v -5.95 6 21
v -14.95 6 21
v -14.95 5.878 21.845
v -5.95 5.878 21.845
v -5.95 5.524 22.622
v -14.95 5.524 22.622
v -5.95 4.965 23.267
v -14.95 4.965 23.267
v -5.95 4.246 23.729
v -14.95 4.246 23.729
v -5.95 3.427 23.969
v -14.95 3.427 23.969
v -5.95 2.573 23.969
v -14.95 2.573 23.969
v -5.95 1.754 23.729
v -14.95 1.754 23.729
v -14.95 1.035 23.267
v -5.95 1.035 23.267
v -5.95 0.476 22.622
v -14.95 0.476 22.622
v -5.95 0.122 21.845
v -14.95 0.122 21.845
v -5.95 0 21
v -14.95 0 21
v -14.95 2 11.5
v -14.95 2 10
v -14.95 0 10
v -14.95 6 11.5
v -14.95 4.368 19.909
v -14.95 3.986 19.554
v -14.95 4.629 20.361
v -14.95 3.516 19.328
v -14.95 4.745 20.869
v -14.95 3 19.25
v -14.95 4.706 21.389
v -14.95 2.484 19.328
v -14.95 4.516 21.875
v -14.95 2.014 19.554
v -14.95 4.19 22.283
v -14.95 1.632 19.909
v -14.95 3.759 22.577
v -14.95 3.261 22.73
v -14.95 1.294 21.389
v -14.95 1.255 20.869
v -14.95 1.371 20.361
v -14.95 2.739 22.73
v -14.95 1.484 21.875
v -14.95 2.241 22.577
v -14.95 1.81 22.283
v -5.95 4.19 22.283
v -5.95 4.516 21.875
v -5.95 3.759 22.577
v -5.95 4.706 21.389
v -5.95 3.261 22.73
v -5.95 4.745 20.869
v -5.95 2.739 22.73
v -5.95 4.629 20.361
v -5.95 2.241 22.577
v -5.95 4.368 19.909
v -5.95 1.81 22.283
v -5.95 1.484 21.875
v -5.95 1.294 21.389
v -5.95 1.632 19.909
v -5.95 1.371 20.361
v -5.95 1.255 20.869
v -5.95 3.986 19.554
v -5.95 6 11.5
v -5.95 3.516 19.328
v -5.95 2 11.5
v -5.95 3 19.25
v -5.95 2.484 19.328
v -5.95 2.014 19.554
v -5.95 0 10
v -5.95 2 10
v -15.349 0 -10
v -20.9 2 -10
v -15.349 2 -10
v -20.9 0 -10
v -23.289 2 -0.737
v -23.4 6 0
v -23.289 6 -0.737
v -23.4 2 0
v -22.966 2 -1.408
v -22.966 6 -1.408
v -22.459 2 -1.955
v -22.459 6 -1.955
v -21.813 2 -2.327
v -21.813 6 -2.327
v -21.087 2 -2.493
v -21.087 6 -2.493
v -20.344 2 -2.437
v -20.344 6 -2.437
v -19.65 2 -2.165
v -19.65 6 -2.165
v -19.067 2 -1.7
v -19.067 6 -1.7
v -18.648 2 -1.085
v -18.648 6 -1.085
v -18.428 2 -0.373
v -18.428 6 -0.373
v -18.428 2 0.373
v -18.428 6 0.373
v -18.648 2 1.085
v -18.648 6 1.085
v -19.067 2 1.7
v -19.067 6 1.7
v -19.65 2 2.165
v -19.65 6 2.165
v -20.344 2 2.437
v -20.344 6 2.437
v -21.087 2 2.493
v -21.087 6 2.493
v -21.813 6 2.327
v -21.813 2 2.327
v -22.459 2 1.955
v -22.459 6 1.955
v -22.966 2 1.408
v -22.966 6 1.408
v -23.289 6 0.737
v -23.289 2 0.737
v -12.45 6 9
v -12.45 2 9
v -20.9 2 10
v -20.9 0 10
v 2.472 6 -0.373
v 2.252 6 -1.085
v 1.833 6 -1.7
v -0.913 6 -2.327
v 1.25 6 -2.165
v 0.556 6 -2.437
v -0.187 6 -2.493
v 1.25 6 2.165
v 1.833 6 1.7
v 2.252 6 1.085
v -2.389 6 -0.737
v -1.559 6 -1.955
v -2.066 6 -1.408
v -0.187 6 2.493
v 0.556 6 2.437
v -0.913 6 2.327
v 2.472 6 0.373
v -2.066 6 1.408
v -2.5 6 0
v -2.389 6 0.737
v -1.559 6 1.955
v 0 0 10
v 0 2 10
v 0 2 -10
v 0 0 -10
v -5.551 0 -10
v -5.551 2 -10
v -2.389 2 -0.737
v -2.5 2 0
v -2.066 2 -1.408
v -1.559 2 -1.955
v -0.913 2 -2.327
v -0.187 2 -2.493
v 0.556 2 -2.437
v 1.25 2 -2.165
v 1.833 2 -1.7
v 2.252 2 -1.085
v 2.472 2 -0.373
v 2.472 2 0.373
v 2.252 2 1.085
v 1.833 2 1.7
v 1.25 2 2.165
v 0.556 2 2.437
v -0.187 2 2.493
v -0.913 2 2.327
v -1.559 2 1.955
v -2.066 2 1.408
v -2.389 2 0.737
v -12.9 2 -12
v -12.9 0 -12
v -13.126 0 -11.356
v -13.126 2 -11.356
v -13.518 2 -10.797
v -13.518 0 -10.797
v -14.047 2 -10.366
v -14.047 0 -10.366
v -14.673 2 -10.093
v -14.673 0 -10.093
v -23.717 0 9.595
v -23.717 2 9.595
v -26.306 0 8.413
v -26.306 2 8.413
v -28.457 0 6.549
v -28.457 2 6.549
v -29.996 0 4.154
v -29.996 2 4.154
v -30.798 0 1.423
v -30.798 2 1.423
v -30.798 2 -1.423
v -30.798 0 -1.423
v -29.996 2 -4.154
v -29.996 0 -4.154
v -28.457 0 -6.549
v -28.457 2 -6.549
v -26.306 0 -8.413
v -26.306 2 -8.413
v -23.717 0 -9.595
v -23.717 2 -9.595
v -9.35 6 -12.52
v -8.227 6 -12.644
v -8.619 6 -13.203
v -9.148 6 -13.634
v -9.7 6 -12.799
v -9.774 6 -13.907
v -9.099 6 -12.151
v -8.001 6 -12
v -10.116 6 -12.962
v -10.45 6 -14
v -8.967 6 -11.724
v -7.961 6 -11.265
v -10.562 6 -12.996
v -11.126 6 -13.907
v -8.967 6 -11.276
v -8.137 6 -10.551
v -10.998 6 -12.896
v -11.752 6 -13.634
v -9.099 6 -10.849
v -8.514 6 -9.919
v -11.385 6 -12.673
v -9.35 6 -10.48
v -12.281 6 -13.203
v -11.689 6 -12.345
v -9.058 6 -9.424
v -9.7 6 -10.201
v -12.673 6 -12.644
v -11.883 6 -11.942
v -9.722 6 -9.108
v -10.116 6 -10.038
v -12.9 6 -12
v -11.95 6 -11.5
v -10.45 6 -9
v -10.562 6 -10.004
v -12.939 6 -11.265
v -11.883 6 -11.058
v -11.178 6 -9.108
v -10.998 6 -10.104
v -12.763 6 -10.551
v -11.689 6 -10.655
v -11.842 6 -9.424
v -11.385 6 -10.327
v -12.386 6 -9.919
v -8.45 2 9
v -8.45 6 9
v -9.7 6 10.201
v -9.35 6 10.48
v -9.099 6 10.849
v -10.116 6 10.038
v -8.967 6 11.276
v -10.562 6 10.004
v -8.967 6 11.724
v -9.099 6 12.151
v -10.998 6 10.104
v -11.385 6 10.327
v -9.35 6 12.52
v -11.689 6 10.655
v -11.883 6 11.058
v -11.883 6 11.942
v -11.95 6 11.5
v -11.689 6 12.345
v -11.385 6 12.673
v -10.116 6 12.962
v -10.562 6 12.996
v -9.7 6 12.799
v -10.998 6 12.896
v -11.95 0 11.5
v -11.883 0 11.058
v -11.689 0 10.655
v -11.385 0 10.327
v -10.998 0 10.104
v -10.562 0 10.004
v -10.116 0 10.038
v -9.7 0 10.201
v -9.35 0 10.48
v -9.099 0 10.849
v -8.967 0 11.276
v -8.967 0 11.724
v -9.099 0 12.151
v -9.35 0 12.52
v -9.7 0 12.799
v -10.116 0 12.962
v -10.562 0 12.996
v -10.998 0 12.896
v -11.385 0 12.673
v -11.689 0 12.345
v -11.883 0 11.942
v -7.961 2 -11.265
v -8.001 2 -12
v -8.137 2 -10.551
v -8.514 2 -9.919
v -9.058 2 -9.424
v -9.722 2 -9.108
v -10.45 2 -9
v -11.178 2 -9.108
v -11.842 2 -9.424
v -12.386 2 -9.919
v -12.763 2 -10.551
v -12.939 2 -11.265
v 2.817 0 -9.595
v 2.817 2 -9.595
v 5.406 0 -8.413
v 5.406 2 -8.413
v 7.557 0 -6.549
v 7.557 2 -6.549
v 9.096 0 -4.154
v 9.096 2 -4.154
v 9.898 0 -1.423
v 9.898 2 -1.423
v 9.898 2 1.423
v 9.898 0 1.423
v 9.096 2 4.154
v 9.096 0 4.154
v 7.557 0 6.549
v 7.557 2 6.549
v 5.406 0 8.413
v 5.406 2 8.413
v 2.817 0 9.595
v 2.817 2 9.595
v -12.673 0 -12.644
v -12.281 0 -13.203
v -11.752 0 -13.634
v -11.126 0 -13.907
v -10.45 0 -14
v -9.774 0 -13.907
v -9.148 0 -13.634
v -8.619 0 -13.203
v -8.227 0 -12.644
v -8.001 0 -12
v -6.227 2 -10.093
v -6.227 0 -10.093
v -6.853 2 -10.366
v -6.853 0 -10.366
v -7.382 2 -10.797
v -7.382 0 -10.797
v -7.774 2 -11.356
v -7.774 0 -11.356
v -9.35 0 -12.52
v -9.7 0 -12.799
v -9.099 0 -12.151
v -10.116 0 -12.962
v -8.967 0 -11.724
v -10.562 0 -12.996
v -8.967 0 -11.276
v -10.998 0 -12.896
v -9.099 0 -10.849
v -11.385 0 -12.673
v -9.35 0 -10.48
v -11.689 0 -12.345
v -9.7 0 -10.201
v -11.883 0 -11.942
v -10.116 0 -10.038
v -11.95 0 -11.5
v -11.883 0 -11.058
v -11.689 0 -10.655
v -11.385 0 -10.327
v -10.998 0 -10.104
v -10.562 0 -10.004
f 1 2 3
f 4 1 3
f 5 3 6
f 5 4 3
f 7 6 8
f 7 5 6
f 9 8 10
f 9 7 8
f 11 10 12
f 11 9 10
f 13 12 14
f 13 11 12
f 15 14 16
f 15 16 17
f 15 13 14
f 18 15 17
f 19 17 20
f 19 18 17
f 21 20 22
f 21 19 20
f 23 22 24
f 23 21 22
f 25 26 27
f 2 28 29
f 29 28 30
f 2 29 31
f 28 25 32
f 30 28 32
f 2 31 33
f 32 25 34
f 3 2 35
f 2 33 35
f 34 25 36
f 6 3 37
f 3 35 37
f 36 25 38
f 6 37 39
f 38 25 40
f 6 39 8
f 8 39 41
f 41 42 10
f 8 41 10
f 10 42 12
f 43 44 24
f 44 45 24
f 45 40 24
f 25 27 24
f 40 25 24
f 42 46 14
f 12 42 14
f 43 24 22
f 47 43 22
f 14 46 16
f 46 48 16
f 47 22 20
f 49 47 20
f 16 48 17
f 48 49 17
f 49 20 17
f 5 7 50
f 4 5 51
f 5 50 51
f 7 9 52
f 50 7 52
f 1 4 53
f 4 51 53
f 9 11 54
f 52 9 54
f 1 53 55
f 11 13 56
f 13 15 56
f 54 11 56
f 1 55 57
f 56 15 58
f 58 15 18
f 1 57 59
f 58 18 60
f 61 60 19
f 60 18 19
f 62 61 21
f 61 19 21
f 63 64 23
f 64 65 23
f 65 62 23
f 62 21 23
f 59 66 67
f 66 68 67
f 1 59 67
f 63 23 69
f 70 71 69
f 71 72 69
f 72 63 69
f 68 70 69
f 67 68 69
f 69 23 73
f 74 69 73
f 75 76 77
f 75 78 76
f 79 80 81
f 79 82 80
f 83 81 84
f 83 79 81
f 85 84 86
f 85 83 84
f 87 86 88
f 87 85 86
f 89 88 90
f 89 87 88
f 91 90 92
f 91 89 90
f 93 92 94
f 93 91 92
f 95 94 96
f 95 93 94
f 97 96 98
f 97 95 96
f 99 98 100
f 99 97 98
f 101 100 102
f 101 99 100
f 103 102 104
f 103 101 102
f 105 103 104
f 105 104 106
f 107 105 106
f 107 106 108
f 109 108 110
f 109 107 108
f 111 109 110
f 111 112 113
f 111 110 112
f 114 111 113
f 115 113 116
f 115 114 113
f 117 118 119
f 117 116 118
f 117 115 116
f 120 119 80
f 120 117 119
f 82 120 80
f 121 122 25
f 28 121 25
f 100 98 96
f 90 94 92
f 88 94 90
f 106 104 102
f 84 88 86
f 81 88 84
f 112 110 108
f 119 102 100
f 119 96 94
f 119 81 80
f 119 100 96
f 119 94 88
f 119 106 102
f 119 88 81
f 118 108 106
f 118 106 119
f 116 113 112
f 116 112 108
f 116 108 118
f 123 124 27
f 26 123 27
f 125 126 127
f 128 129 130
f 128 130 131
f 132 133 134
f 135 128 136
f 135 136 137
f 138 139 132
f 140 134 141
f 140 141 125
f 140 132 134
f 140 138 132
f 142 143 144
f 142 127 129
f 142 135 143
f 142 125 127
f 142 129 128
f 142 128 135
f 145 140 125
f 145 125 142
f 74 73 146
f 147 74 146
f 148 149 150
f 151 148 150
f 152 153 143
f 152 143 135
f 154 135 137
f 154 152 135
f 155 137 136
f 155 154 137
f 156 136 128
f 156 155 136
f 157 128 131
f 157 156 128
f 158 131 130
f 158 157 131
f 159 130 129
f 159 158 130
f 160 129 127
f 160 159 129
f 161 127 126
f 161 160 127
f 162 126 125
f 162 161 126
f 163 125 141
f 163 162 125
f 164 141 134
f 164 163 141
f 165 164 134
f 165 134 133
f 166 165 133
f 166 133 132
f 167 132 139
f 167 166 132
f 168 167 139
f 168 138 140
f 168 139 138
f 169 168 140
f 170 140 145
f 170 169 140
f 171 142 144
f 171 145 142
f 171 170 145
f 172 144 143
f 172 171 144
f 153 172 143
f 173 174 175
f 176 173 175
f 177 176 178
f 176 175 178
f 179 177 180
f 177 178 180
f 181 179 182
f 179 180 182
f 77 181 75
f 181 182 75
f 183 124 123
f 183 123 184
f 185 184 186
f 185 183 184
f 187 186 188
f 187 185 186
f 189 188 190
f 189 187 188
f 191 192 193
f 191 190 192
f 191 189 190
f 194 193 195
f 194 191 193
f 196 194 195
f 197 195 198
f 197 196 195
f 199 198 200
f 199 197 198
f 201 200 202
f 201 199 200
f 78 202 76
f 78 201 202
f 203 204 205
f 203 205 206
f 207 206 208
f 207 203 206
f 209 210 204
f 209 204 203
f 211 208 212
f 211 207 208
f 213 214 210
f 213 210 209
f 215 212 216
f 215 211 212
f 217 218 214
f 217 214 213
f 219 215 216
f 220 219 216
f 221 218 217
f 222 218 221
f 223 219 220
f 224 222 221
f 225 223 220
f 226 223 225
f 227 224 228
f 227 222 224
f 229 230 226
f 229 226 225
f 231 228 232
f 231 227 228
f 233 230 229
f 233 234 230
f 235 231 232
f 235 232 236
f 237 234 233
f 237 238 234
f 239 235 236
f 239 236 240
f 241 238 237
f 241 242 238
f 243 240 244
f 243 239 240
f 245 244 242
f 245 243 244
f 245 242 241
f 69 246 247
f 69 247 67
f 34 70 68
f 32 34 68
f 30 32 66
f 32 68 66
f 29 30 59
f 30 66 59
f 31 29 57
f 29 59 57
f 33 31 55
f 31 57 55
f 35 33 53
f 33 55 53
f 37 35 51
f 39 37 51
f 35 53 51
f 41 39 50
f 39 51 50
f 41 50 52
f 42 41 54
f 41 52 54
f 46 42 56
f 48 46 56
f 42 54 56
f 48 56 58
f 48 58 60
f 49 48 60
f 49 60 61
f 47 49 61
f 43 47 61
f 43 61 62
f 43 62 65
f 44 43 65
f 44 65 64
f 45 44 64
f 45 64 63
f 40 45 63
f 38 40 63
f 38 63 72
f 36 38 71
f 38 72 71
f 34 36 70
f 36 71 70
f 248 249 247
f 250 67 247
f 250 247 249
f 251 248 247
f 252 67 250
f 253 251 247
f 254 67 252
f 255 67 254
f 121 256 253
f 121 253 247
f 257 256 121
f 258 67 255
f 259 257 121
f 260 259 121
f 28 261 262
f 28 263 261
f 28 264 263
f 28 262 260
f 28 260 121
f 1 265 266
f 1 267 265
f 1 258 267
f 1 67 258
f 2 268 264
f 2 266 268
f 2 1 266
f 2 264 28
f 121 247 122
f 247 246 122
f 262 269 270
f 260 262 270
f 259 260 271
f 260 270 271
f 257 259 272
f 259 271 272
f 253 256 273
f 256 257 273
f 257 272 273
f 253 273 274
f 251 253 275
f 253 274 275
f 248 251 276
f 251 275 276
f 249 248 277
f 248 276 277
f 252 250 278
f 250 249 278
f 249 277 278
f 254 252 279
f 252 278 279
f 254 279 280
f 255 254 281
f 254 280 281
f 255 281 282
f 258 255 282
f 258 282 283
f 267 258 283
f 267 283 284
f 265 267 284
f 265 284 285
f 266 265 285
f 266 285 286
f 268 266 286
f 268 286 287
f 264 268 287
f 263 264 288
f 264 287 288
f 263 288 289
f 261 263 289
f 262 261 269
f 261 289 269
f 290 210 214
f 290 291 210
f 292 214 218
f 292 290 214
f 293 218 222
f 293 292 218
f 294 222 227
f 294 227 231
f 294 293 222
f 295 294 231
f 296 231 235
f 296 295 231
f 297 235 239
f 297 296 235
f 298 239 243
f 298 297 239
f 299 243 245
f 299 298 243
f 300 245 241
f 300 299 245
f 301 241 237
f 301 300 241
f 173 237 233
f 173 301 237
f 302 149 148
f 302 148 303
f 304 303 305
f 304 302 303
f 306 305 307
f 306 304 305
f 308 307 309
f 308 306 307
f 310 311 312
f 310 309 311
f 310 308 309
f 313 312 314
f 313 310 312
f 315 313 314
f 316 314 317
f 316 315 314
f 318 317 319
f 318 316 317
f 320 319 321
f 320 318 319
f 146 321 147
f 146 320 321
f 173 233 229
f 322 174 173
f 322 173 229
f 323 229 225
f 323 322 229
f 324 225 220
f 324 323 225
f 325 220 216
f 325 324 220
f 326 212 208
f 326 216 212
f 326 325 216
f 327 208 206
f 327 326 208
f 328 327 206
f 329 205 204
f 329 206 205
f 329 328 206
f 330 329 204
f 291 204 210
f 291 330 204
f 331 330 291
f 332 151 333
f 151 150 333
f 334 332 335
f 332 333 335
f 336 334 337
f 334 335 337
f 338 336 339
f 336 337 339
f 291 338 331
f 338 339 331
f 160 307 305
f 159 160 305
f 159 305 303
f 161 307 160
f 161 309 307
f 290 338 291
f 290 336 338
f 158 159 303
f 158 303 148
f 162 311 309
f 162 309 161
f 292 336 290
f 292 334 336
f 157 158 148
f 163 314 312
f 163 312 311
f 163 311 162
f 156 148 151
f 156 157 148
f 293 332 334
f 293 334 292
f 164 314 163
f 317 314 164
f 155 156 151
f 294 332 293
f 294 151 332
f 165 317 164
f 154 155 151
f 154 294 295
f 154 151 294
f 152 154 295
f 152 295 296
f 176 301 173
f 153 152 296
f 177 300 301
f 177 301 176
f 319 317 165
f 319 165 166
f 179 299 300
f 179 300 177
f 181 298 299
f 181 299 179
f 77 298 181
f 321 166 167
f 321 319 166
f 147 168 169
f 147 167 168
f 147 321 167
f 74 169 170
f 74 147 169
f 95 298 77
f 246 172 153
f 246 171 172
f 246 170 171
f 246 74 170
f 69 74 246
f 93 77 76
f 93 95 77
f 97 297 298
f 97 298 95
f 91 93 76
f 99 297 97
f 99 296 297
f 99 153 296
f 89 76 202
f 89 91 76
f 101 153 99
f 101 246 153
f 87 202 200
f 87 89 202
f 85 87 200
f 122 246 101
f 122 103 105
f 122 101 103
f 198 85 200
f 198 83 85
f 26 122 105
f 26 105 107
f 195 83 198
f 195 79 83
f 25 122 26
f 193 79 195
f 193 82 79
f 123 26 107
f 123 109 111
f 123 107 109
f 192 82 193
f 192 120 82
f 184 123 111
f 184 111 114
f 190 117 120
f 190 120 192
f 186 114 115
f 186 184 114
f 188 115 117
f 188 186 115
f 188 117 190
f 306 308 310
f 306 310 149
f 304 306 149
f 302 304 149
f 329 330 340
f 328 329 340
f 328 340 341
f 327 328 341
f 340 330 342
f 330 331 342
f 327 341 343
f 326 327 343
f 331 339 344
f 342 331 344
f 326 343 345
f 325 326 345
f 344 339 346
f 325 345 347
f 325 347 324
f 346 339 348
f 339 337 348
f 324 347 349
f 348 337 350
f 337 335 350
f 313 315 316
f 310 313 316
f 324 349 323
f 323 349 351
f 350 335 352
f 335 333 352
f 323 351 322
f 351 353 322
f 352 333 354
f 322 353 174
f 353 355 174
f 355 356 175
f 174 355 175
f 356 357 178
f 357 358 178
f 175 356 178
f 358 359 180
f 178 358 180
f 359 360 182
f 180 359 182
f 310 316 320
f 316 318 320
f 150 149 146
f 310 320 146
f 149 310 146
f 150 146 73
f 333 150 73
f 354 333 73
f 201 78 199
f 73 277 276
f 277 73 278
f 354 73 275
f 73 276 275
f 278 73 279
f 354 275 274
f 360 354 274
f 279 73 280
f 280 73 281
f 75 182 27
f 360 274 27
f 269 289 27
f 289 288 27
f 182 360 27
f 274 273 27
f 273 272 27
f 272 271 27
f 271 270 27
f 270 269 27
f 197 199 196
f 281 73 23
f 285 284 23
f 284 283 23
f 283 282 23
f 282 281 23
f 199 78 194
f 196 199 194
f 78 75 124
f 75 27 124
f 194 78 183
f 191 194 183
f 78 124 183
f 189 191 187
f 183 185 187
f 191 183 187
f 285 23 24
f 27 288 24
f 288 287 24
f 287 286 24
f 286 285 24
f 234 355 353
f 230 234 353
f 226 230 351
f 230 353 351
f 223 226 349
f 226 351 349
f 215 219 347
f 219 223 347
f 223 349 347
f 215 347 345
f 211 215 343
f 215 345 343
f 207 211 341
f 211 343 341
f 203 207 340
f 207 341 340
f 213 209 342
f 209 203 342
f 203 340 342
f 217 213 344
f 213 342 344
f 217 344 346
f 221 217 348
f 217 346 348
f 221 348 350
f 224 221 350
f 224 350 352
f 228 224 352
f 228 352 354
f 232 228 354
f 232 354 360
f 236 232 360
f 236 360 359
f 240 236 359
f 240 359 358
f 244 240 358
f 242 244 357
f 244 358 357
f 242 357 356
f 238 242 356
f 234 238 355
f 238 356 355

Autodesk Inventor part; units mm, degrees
ref_plane "YZ Plane" through (0, 0, 0) normal (1, 0, 0) x (0, 1, 0)
ref_plane "XZ Plane" through (0, 0, 0) normal (0, 1, 0) x (-1, 0, 0)
ref_plane "XY Plane" through (0, 0, 0) normal (0, 0, 1) x (1, 0, 0)
sketch "Boceto1" plane through (0, 0, 0) normal (0, 1, 0) x (-1, 0, 0)
  circle A0 centre (0, 0) radius 2.5
  arc A1 (0, 10) -> (0, -10) centre (0, 0) ccw
  circle A2 centre (20.9, 0) radius 2.5
  arc A3 (20.9, -10) -> (20.9, 10) centre (20.9, 0) ccw
  line L0 (20.9, 10) -> (14.95, 10)
  line L1 (5.95, 10) -> (0, 10)
  line L2 (14.95, 10) -> (14.95, 24)
  line L3 (14.95, 24) -> (5.95, 24)
  line L4 (5.95, 24) -> (5.95, 10)
  line L5 (10.45, 9) -> (12.45, 9)
  line L6 (12.45, 9) -> (8.45, 9)
  circle A4 centre (10.45, 11.5) radius 1.5
  line L7 (12.45, 9) -> (14.95, 11.5)
  line L8 (8.45, 9) -> (5.95, 11.5)
  circle A5 centre (10.45, -11.5) radius 1.5
  arc A6 (8.0005, -12) -> (12.8995, -12) centre (10.45, -11.5) ccw
  line L9 (20.9, -10) -> (15.349, -10)
  line L10 (0, -10) -> (5.551, -10)
  arc A7 (8.0005, -12) -> (5.551, -10) centre (5.551, -12.5) ccw
  arc A8 (15.349, -10) -> (12.8995, -12) centre (15.349, -12.5) ccw
  circle A9 centre (10.45, -11.5) radius 2.5
  point P0 (8.45, -10)
  point P1 (12.45, -10)
  dimension "d10" = 5
  dimension "d11" = 20
  dimension "d13" = 5
  dimension "d14" = 20
  dimension "d19" = 9
  dimension "d20" = 14
  dimension "d25" = 3
  dimension "d27" = 3
  dimension "d28" = 5
  dimension "d29" = 2.5
  dimension "d30" = 5
extrude "Extrusión1" add sketch "Boceto1" along normal blind 6 contours A0 | L4 L3 L2 L7 L5 L6 L8 | A9 A6 | A2
extrude "Extrusión2" add sketch "Boceto1" along normal blind 2 contours L1 L4 L8 L6 L5 L7 L2 L0 A3 L9 A8 A9 A7 L10 A1
sketch "Boceto2" plane through (-5.95, 0, 24) normal (1, 0, 0) x (0, 0, -1)
  line L0 (0, 0) -> (14, 0) projected
  line L1 (14, 0) -> (14, 2) projected
  line L2 (12.5, 2) -> (14, 2) projected
  line L3 (12.5, 2) -> (12.5, 6) projected
  line L4 (0, 6) -> (12.5, 6) projected
  line L5 (0, 0) -> (0, 6) projected
  line L6 (0, 6) -> (12.5, 6) projected
  line L7 (0, 6) -> (0, 3)
  line L8 (0, 0) -> (0, 6) projected
  line L9 (0, 3) -> (3, 3)
  circle A0 centre (3, 3) radius 3
  circle A1 centre (3, 3) radius 1.75
  line L10 (0, 6) -> (3, 6)
  line L11 (0, 3) -> (0, 0)
  point P0 (24, 0)
  point P1 (3, 6)
  point P2 (3, 0)
  dimension "d37" = 6
  dimension "d35" = 3
  dimension "d36" = 3
  dimension "d38" = 3.5
extrude "Extrusión3" cut sketch "Boceto2" against normal blind 9 contours L5 A0 L0 | A1 | L5 L4 A0
properties part number "basedelapinza1"
